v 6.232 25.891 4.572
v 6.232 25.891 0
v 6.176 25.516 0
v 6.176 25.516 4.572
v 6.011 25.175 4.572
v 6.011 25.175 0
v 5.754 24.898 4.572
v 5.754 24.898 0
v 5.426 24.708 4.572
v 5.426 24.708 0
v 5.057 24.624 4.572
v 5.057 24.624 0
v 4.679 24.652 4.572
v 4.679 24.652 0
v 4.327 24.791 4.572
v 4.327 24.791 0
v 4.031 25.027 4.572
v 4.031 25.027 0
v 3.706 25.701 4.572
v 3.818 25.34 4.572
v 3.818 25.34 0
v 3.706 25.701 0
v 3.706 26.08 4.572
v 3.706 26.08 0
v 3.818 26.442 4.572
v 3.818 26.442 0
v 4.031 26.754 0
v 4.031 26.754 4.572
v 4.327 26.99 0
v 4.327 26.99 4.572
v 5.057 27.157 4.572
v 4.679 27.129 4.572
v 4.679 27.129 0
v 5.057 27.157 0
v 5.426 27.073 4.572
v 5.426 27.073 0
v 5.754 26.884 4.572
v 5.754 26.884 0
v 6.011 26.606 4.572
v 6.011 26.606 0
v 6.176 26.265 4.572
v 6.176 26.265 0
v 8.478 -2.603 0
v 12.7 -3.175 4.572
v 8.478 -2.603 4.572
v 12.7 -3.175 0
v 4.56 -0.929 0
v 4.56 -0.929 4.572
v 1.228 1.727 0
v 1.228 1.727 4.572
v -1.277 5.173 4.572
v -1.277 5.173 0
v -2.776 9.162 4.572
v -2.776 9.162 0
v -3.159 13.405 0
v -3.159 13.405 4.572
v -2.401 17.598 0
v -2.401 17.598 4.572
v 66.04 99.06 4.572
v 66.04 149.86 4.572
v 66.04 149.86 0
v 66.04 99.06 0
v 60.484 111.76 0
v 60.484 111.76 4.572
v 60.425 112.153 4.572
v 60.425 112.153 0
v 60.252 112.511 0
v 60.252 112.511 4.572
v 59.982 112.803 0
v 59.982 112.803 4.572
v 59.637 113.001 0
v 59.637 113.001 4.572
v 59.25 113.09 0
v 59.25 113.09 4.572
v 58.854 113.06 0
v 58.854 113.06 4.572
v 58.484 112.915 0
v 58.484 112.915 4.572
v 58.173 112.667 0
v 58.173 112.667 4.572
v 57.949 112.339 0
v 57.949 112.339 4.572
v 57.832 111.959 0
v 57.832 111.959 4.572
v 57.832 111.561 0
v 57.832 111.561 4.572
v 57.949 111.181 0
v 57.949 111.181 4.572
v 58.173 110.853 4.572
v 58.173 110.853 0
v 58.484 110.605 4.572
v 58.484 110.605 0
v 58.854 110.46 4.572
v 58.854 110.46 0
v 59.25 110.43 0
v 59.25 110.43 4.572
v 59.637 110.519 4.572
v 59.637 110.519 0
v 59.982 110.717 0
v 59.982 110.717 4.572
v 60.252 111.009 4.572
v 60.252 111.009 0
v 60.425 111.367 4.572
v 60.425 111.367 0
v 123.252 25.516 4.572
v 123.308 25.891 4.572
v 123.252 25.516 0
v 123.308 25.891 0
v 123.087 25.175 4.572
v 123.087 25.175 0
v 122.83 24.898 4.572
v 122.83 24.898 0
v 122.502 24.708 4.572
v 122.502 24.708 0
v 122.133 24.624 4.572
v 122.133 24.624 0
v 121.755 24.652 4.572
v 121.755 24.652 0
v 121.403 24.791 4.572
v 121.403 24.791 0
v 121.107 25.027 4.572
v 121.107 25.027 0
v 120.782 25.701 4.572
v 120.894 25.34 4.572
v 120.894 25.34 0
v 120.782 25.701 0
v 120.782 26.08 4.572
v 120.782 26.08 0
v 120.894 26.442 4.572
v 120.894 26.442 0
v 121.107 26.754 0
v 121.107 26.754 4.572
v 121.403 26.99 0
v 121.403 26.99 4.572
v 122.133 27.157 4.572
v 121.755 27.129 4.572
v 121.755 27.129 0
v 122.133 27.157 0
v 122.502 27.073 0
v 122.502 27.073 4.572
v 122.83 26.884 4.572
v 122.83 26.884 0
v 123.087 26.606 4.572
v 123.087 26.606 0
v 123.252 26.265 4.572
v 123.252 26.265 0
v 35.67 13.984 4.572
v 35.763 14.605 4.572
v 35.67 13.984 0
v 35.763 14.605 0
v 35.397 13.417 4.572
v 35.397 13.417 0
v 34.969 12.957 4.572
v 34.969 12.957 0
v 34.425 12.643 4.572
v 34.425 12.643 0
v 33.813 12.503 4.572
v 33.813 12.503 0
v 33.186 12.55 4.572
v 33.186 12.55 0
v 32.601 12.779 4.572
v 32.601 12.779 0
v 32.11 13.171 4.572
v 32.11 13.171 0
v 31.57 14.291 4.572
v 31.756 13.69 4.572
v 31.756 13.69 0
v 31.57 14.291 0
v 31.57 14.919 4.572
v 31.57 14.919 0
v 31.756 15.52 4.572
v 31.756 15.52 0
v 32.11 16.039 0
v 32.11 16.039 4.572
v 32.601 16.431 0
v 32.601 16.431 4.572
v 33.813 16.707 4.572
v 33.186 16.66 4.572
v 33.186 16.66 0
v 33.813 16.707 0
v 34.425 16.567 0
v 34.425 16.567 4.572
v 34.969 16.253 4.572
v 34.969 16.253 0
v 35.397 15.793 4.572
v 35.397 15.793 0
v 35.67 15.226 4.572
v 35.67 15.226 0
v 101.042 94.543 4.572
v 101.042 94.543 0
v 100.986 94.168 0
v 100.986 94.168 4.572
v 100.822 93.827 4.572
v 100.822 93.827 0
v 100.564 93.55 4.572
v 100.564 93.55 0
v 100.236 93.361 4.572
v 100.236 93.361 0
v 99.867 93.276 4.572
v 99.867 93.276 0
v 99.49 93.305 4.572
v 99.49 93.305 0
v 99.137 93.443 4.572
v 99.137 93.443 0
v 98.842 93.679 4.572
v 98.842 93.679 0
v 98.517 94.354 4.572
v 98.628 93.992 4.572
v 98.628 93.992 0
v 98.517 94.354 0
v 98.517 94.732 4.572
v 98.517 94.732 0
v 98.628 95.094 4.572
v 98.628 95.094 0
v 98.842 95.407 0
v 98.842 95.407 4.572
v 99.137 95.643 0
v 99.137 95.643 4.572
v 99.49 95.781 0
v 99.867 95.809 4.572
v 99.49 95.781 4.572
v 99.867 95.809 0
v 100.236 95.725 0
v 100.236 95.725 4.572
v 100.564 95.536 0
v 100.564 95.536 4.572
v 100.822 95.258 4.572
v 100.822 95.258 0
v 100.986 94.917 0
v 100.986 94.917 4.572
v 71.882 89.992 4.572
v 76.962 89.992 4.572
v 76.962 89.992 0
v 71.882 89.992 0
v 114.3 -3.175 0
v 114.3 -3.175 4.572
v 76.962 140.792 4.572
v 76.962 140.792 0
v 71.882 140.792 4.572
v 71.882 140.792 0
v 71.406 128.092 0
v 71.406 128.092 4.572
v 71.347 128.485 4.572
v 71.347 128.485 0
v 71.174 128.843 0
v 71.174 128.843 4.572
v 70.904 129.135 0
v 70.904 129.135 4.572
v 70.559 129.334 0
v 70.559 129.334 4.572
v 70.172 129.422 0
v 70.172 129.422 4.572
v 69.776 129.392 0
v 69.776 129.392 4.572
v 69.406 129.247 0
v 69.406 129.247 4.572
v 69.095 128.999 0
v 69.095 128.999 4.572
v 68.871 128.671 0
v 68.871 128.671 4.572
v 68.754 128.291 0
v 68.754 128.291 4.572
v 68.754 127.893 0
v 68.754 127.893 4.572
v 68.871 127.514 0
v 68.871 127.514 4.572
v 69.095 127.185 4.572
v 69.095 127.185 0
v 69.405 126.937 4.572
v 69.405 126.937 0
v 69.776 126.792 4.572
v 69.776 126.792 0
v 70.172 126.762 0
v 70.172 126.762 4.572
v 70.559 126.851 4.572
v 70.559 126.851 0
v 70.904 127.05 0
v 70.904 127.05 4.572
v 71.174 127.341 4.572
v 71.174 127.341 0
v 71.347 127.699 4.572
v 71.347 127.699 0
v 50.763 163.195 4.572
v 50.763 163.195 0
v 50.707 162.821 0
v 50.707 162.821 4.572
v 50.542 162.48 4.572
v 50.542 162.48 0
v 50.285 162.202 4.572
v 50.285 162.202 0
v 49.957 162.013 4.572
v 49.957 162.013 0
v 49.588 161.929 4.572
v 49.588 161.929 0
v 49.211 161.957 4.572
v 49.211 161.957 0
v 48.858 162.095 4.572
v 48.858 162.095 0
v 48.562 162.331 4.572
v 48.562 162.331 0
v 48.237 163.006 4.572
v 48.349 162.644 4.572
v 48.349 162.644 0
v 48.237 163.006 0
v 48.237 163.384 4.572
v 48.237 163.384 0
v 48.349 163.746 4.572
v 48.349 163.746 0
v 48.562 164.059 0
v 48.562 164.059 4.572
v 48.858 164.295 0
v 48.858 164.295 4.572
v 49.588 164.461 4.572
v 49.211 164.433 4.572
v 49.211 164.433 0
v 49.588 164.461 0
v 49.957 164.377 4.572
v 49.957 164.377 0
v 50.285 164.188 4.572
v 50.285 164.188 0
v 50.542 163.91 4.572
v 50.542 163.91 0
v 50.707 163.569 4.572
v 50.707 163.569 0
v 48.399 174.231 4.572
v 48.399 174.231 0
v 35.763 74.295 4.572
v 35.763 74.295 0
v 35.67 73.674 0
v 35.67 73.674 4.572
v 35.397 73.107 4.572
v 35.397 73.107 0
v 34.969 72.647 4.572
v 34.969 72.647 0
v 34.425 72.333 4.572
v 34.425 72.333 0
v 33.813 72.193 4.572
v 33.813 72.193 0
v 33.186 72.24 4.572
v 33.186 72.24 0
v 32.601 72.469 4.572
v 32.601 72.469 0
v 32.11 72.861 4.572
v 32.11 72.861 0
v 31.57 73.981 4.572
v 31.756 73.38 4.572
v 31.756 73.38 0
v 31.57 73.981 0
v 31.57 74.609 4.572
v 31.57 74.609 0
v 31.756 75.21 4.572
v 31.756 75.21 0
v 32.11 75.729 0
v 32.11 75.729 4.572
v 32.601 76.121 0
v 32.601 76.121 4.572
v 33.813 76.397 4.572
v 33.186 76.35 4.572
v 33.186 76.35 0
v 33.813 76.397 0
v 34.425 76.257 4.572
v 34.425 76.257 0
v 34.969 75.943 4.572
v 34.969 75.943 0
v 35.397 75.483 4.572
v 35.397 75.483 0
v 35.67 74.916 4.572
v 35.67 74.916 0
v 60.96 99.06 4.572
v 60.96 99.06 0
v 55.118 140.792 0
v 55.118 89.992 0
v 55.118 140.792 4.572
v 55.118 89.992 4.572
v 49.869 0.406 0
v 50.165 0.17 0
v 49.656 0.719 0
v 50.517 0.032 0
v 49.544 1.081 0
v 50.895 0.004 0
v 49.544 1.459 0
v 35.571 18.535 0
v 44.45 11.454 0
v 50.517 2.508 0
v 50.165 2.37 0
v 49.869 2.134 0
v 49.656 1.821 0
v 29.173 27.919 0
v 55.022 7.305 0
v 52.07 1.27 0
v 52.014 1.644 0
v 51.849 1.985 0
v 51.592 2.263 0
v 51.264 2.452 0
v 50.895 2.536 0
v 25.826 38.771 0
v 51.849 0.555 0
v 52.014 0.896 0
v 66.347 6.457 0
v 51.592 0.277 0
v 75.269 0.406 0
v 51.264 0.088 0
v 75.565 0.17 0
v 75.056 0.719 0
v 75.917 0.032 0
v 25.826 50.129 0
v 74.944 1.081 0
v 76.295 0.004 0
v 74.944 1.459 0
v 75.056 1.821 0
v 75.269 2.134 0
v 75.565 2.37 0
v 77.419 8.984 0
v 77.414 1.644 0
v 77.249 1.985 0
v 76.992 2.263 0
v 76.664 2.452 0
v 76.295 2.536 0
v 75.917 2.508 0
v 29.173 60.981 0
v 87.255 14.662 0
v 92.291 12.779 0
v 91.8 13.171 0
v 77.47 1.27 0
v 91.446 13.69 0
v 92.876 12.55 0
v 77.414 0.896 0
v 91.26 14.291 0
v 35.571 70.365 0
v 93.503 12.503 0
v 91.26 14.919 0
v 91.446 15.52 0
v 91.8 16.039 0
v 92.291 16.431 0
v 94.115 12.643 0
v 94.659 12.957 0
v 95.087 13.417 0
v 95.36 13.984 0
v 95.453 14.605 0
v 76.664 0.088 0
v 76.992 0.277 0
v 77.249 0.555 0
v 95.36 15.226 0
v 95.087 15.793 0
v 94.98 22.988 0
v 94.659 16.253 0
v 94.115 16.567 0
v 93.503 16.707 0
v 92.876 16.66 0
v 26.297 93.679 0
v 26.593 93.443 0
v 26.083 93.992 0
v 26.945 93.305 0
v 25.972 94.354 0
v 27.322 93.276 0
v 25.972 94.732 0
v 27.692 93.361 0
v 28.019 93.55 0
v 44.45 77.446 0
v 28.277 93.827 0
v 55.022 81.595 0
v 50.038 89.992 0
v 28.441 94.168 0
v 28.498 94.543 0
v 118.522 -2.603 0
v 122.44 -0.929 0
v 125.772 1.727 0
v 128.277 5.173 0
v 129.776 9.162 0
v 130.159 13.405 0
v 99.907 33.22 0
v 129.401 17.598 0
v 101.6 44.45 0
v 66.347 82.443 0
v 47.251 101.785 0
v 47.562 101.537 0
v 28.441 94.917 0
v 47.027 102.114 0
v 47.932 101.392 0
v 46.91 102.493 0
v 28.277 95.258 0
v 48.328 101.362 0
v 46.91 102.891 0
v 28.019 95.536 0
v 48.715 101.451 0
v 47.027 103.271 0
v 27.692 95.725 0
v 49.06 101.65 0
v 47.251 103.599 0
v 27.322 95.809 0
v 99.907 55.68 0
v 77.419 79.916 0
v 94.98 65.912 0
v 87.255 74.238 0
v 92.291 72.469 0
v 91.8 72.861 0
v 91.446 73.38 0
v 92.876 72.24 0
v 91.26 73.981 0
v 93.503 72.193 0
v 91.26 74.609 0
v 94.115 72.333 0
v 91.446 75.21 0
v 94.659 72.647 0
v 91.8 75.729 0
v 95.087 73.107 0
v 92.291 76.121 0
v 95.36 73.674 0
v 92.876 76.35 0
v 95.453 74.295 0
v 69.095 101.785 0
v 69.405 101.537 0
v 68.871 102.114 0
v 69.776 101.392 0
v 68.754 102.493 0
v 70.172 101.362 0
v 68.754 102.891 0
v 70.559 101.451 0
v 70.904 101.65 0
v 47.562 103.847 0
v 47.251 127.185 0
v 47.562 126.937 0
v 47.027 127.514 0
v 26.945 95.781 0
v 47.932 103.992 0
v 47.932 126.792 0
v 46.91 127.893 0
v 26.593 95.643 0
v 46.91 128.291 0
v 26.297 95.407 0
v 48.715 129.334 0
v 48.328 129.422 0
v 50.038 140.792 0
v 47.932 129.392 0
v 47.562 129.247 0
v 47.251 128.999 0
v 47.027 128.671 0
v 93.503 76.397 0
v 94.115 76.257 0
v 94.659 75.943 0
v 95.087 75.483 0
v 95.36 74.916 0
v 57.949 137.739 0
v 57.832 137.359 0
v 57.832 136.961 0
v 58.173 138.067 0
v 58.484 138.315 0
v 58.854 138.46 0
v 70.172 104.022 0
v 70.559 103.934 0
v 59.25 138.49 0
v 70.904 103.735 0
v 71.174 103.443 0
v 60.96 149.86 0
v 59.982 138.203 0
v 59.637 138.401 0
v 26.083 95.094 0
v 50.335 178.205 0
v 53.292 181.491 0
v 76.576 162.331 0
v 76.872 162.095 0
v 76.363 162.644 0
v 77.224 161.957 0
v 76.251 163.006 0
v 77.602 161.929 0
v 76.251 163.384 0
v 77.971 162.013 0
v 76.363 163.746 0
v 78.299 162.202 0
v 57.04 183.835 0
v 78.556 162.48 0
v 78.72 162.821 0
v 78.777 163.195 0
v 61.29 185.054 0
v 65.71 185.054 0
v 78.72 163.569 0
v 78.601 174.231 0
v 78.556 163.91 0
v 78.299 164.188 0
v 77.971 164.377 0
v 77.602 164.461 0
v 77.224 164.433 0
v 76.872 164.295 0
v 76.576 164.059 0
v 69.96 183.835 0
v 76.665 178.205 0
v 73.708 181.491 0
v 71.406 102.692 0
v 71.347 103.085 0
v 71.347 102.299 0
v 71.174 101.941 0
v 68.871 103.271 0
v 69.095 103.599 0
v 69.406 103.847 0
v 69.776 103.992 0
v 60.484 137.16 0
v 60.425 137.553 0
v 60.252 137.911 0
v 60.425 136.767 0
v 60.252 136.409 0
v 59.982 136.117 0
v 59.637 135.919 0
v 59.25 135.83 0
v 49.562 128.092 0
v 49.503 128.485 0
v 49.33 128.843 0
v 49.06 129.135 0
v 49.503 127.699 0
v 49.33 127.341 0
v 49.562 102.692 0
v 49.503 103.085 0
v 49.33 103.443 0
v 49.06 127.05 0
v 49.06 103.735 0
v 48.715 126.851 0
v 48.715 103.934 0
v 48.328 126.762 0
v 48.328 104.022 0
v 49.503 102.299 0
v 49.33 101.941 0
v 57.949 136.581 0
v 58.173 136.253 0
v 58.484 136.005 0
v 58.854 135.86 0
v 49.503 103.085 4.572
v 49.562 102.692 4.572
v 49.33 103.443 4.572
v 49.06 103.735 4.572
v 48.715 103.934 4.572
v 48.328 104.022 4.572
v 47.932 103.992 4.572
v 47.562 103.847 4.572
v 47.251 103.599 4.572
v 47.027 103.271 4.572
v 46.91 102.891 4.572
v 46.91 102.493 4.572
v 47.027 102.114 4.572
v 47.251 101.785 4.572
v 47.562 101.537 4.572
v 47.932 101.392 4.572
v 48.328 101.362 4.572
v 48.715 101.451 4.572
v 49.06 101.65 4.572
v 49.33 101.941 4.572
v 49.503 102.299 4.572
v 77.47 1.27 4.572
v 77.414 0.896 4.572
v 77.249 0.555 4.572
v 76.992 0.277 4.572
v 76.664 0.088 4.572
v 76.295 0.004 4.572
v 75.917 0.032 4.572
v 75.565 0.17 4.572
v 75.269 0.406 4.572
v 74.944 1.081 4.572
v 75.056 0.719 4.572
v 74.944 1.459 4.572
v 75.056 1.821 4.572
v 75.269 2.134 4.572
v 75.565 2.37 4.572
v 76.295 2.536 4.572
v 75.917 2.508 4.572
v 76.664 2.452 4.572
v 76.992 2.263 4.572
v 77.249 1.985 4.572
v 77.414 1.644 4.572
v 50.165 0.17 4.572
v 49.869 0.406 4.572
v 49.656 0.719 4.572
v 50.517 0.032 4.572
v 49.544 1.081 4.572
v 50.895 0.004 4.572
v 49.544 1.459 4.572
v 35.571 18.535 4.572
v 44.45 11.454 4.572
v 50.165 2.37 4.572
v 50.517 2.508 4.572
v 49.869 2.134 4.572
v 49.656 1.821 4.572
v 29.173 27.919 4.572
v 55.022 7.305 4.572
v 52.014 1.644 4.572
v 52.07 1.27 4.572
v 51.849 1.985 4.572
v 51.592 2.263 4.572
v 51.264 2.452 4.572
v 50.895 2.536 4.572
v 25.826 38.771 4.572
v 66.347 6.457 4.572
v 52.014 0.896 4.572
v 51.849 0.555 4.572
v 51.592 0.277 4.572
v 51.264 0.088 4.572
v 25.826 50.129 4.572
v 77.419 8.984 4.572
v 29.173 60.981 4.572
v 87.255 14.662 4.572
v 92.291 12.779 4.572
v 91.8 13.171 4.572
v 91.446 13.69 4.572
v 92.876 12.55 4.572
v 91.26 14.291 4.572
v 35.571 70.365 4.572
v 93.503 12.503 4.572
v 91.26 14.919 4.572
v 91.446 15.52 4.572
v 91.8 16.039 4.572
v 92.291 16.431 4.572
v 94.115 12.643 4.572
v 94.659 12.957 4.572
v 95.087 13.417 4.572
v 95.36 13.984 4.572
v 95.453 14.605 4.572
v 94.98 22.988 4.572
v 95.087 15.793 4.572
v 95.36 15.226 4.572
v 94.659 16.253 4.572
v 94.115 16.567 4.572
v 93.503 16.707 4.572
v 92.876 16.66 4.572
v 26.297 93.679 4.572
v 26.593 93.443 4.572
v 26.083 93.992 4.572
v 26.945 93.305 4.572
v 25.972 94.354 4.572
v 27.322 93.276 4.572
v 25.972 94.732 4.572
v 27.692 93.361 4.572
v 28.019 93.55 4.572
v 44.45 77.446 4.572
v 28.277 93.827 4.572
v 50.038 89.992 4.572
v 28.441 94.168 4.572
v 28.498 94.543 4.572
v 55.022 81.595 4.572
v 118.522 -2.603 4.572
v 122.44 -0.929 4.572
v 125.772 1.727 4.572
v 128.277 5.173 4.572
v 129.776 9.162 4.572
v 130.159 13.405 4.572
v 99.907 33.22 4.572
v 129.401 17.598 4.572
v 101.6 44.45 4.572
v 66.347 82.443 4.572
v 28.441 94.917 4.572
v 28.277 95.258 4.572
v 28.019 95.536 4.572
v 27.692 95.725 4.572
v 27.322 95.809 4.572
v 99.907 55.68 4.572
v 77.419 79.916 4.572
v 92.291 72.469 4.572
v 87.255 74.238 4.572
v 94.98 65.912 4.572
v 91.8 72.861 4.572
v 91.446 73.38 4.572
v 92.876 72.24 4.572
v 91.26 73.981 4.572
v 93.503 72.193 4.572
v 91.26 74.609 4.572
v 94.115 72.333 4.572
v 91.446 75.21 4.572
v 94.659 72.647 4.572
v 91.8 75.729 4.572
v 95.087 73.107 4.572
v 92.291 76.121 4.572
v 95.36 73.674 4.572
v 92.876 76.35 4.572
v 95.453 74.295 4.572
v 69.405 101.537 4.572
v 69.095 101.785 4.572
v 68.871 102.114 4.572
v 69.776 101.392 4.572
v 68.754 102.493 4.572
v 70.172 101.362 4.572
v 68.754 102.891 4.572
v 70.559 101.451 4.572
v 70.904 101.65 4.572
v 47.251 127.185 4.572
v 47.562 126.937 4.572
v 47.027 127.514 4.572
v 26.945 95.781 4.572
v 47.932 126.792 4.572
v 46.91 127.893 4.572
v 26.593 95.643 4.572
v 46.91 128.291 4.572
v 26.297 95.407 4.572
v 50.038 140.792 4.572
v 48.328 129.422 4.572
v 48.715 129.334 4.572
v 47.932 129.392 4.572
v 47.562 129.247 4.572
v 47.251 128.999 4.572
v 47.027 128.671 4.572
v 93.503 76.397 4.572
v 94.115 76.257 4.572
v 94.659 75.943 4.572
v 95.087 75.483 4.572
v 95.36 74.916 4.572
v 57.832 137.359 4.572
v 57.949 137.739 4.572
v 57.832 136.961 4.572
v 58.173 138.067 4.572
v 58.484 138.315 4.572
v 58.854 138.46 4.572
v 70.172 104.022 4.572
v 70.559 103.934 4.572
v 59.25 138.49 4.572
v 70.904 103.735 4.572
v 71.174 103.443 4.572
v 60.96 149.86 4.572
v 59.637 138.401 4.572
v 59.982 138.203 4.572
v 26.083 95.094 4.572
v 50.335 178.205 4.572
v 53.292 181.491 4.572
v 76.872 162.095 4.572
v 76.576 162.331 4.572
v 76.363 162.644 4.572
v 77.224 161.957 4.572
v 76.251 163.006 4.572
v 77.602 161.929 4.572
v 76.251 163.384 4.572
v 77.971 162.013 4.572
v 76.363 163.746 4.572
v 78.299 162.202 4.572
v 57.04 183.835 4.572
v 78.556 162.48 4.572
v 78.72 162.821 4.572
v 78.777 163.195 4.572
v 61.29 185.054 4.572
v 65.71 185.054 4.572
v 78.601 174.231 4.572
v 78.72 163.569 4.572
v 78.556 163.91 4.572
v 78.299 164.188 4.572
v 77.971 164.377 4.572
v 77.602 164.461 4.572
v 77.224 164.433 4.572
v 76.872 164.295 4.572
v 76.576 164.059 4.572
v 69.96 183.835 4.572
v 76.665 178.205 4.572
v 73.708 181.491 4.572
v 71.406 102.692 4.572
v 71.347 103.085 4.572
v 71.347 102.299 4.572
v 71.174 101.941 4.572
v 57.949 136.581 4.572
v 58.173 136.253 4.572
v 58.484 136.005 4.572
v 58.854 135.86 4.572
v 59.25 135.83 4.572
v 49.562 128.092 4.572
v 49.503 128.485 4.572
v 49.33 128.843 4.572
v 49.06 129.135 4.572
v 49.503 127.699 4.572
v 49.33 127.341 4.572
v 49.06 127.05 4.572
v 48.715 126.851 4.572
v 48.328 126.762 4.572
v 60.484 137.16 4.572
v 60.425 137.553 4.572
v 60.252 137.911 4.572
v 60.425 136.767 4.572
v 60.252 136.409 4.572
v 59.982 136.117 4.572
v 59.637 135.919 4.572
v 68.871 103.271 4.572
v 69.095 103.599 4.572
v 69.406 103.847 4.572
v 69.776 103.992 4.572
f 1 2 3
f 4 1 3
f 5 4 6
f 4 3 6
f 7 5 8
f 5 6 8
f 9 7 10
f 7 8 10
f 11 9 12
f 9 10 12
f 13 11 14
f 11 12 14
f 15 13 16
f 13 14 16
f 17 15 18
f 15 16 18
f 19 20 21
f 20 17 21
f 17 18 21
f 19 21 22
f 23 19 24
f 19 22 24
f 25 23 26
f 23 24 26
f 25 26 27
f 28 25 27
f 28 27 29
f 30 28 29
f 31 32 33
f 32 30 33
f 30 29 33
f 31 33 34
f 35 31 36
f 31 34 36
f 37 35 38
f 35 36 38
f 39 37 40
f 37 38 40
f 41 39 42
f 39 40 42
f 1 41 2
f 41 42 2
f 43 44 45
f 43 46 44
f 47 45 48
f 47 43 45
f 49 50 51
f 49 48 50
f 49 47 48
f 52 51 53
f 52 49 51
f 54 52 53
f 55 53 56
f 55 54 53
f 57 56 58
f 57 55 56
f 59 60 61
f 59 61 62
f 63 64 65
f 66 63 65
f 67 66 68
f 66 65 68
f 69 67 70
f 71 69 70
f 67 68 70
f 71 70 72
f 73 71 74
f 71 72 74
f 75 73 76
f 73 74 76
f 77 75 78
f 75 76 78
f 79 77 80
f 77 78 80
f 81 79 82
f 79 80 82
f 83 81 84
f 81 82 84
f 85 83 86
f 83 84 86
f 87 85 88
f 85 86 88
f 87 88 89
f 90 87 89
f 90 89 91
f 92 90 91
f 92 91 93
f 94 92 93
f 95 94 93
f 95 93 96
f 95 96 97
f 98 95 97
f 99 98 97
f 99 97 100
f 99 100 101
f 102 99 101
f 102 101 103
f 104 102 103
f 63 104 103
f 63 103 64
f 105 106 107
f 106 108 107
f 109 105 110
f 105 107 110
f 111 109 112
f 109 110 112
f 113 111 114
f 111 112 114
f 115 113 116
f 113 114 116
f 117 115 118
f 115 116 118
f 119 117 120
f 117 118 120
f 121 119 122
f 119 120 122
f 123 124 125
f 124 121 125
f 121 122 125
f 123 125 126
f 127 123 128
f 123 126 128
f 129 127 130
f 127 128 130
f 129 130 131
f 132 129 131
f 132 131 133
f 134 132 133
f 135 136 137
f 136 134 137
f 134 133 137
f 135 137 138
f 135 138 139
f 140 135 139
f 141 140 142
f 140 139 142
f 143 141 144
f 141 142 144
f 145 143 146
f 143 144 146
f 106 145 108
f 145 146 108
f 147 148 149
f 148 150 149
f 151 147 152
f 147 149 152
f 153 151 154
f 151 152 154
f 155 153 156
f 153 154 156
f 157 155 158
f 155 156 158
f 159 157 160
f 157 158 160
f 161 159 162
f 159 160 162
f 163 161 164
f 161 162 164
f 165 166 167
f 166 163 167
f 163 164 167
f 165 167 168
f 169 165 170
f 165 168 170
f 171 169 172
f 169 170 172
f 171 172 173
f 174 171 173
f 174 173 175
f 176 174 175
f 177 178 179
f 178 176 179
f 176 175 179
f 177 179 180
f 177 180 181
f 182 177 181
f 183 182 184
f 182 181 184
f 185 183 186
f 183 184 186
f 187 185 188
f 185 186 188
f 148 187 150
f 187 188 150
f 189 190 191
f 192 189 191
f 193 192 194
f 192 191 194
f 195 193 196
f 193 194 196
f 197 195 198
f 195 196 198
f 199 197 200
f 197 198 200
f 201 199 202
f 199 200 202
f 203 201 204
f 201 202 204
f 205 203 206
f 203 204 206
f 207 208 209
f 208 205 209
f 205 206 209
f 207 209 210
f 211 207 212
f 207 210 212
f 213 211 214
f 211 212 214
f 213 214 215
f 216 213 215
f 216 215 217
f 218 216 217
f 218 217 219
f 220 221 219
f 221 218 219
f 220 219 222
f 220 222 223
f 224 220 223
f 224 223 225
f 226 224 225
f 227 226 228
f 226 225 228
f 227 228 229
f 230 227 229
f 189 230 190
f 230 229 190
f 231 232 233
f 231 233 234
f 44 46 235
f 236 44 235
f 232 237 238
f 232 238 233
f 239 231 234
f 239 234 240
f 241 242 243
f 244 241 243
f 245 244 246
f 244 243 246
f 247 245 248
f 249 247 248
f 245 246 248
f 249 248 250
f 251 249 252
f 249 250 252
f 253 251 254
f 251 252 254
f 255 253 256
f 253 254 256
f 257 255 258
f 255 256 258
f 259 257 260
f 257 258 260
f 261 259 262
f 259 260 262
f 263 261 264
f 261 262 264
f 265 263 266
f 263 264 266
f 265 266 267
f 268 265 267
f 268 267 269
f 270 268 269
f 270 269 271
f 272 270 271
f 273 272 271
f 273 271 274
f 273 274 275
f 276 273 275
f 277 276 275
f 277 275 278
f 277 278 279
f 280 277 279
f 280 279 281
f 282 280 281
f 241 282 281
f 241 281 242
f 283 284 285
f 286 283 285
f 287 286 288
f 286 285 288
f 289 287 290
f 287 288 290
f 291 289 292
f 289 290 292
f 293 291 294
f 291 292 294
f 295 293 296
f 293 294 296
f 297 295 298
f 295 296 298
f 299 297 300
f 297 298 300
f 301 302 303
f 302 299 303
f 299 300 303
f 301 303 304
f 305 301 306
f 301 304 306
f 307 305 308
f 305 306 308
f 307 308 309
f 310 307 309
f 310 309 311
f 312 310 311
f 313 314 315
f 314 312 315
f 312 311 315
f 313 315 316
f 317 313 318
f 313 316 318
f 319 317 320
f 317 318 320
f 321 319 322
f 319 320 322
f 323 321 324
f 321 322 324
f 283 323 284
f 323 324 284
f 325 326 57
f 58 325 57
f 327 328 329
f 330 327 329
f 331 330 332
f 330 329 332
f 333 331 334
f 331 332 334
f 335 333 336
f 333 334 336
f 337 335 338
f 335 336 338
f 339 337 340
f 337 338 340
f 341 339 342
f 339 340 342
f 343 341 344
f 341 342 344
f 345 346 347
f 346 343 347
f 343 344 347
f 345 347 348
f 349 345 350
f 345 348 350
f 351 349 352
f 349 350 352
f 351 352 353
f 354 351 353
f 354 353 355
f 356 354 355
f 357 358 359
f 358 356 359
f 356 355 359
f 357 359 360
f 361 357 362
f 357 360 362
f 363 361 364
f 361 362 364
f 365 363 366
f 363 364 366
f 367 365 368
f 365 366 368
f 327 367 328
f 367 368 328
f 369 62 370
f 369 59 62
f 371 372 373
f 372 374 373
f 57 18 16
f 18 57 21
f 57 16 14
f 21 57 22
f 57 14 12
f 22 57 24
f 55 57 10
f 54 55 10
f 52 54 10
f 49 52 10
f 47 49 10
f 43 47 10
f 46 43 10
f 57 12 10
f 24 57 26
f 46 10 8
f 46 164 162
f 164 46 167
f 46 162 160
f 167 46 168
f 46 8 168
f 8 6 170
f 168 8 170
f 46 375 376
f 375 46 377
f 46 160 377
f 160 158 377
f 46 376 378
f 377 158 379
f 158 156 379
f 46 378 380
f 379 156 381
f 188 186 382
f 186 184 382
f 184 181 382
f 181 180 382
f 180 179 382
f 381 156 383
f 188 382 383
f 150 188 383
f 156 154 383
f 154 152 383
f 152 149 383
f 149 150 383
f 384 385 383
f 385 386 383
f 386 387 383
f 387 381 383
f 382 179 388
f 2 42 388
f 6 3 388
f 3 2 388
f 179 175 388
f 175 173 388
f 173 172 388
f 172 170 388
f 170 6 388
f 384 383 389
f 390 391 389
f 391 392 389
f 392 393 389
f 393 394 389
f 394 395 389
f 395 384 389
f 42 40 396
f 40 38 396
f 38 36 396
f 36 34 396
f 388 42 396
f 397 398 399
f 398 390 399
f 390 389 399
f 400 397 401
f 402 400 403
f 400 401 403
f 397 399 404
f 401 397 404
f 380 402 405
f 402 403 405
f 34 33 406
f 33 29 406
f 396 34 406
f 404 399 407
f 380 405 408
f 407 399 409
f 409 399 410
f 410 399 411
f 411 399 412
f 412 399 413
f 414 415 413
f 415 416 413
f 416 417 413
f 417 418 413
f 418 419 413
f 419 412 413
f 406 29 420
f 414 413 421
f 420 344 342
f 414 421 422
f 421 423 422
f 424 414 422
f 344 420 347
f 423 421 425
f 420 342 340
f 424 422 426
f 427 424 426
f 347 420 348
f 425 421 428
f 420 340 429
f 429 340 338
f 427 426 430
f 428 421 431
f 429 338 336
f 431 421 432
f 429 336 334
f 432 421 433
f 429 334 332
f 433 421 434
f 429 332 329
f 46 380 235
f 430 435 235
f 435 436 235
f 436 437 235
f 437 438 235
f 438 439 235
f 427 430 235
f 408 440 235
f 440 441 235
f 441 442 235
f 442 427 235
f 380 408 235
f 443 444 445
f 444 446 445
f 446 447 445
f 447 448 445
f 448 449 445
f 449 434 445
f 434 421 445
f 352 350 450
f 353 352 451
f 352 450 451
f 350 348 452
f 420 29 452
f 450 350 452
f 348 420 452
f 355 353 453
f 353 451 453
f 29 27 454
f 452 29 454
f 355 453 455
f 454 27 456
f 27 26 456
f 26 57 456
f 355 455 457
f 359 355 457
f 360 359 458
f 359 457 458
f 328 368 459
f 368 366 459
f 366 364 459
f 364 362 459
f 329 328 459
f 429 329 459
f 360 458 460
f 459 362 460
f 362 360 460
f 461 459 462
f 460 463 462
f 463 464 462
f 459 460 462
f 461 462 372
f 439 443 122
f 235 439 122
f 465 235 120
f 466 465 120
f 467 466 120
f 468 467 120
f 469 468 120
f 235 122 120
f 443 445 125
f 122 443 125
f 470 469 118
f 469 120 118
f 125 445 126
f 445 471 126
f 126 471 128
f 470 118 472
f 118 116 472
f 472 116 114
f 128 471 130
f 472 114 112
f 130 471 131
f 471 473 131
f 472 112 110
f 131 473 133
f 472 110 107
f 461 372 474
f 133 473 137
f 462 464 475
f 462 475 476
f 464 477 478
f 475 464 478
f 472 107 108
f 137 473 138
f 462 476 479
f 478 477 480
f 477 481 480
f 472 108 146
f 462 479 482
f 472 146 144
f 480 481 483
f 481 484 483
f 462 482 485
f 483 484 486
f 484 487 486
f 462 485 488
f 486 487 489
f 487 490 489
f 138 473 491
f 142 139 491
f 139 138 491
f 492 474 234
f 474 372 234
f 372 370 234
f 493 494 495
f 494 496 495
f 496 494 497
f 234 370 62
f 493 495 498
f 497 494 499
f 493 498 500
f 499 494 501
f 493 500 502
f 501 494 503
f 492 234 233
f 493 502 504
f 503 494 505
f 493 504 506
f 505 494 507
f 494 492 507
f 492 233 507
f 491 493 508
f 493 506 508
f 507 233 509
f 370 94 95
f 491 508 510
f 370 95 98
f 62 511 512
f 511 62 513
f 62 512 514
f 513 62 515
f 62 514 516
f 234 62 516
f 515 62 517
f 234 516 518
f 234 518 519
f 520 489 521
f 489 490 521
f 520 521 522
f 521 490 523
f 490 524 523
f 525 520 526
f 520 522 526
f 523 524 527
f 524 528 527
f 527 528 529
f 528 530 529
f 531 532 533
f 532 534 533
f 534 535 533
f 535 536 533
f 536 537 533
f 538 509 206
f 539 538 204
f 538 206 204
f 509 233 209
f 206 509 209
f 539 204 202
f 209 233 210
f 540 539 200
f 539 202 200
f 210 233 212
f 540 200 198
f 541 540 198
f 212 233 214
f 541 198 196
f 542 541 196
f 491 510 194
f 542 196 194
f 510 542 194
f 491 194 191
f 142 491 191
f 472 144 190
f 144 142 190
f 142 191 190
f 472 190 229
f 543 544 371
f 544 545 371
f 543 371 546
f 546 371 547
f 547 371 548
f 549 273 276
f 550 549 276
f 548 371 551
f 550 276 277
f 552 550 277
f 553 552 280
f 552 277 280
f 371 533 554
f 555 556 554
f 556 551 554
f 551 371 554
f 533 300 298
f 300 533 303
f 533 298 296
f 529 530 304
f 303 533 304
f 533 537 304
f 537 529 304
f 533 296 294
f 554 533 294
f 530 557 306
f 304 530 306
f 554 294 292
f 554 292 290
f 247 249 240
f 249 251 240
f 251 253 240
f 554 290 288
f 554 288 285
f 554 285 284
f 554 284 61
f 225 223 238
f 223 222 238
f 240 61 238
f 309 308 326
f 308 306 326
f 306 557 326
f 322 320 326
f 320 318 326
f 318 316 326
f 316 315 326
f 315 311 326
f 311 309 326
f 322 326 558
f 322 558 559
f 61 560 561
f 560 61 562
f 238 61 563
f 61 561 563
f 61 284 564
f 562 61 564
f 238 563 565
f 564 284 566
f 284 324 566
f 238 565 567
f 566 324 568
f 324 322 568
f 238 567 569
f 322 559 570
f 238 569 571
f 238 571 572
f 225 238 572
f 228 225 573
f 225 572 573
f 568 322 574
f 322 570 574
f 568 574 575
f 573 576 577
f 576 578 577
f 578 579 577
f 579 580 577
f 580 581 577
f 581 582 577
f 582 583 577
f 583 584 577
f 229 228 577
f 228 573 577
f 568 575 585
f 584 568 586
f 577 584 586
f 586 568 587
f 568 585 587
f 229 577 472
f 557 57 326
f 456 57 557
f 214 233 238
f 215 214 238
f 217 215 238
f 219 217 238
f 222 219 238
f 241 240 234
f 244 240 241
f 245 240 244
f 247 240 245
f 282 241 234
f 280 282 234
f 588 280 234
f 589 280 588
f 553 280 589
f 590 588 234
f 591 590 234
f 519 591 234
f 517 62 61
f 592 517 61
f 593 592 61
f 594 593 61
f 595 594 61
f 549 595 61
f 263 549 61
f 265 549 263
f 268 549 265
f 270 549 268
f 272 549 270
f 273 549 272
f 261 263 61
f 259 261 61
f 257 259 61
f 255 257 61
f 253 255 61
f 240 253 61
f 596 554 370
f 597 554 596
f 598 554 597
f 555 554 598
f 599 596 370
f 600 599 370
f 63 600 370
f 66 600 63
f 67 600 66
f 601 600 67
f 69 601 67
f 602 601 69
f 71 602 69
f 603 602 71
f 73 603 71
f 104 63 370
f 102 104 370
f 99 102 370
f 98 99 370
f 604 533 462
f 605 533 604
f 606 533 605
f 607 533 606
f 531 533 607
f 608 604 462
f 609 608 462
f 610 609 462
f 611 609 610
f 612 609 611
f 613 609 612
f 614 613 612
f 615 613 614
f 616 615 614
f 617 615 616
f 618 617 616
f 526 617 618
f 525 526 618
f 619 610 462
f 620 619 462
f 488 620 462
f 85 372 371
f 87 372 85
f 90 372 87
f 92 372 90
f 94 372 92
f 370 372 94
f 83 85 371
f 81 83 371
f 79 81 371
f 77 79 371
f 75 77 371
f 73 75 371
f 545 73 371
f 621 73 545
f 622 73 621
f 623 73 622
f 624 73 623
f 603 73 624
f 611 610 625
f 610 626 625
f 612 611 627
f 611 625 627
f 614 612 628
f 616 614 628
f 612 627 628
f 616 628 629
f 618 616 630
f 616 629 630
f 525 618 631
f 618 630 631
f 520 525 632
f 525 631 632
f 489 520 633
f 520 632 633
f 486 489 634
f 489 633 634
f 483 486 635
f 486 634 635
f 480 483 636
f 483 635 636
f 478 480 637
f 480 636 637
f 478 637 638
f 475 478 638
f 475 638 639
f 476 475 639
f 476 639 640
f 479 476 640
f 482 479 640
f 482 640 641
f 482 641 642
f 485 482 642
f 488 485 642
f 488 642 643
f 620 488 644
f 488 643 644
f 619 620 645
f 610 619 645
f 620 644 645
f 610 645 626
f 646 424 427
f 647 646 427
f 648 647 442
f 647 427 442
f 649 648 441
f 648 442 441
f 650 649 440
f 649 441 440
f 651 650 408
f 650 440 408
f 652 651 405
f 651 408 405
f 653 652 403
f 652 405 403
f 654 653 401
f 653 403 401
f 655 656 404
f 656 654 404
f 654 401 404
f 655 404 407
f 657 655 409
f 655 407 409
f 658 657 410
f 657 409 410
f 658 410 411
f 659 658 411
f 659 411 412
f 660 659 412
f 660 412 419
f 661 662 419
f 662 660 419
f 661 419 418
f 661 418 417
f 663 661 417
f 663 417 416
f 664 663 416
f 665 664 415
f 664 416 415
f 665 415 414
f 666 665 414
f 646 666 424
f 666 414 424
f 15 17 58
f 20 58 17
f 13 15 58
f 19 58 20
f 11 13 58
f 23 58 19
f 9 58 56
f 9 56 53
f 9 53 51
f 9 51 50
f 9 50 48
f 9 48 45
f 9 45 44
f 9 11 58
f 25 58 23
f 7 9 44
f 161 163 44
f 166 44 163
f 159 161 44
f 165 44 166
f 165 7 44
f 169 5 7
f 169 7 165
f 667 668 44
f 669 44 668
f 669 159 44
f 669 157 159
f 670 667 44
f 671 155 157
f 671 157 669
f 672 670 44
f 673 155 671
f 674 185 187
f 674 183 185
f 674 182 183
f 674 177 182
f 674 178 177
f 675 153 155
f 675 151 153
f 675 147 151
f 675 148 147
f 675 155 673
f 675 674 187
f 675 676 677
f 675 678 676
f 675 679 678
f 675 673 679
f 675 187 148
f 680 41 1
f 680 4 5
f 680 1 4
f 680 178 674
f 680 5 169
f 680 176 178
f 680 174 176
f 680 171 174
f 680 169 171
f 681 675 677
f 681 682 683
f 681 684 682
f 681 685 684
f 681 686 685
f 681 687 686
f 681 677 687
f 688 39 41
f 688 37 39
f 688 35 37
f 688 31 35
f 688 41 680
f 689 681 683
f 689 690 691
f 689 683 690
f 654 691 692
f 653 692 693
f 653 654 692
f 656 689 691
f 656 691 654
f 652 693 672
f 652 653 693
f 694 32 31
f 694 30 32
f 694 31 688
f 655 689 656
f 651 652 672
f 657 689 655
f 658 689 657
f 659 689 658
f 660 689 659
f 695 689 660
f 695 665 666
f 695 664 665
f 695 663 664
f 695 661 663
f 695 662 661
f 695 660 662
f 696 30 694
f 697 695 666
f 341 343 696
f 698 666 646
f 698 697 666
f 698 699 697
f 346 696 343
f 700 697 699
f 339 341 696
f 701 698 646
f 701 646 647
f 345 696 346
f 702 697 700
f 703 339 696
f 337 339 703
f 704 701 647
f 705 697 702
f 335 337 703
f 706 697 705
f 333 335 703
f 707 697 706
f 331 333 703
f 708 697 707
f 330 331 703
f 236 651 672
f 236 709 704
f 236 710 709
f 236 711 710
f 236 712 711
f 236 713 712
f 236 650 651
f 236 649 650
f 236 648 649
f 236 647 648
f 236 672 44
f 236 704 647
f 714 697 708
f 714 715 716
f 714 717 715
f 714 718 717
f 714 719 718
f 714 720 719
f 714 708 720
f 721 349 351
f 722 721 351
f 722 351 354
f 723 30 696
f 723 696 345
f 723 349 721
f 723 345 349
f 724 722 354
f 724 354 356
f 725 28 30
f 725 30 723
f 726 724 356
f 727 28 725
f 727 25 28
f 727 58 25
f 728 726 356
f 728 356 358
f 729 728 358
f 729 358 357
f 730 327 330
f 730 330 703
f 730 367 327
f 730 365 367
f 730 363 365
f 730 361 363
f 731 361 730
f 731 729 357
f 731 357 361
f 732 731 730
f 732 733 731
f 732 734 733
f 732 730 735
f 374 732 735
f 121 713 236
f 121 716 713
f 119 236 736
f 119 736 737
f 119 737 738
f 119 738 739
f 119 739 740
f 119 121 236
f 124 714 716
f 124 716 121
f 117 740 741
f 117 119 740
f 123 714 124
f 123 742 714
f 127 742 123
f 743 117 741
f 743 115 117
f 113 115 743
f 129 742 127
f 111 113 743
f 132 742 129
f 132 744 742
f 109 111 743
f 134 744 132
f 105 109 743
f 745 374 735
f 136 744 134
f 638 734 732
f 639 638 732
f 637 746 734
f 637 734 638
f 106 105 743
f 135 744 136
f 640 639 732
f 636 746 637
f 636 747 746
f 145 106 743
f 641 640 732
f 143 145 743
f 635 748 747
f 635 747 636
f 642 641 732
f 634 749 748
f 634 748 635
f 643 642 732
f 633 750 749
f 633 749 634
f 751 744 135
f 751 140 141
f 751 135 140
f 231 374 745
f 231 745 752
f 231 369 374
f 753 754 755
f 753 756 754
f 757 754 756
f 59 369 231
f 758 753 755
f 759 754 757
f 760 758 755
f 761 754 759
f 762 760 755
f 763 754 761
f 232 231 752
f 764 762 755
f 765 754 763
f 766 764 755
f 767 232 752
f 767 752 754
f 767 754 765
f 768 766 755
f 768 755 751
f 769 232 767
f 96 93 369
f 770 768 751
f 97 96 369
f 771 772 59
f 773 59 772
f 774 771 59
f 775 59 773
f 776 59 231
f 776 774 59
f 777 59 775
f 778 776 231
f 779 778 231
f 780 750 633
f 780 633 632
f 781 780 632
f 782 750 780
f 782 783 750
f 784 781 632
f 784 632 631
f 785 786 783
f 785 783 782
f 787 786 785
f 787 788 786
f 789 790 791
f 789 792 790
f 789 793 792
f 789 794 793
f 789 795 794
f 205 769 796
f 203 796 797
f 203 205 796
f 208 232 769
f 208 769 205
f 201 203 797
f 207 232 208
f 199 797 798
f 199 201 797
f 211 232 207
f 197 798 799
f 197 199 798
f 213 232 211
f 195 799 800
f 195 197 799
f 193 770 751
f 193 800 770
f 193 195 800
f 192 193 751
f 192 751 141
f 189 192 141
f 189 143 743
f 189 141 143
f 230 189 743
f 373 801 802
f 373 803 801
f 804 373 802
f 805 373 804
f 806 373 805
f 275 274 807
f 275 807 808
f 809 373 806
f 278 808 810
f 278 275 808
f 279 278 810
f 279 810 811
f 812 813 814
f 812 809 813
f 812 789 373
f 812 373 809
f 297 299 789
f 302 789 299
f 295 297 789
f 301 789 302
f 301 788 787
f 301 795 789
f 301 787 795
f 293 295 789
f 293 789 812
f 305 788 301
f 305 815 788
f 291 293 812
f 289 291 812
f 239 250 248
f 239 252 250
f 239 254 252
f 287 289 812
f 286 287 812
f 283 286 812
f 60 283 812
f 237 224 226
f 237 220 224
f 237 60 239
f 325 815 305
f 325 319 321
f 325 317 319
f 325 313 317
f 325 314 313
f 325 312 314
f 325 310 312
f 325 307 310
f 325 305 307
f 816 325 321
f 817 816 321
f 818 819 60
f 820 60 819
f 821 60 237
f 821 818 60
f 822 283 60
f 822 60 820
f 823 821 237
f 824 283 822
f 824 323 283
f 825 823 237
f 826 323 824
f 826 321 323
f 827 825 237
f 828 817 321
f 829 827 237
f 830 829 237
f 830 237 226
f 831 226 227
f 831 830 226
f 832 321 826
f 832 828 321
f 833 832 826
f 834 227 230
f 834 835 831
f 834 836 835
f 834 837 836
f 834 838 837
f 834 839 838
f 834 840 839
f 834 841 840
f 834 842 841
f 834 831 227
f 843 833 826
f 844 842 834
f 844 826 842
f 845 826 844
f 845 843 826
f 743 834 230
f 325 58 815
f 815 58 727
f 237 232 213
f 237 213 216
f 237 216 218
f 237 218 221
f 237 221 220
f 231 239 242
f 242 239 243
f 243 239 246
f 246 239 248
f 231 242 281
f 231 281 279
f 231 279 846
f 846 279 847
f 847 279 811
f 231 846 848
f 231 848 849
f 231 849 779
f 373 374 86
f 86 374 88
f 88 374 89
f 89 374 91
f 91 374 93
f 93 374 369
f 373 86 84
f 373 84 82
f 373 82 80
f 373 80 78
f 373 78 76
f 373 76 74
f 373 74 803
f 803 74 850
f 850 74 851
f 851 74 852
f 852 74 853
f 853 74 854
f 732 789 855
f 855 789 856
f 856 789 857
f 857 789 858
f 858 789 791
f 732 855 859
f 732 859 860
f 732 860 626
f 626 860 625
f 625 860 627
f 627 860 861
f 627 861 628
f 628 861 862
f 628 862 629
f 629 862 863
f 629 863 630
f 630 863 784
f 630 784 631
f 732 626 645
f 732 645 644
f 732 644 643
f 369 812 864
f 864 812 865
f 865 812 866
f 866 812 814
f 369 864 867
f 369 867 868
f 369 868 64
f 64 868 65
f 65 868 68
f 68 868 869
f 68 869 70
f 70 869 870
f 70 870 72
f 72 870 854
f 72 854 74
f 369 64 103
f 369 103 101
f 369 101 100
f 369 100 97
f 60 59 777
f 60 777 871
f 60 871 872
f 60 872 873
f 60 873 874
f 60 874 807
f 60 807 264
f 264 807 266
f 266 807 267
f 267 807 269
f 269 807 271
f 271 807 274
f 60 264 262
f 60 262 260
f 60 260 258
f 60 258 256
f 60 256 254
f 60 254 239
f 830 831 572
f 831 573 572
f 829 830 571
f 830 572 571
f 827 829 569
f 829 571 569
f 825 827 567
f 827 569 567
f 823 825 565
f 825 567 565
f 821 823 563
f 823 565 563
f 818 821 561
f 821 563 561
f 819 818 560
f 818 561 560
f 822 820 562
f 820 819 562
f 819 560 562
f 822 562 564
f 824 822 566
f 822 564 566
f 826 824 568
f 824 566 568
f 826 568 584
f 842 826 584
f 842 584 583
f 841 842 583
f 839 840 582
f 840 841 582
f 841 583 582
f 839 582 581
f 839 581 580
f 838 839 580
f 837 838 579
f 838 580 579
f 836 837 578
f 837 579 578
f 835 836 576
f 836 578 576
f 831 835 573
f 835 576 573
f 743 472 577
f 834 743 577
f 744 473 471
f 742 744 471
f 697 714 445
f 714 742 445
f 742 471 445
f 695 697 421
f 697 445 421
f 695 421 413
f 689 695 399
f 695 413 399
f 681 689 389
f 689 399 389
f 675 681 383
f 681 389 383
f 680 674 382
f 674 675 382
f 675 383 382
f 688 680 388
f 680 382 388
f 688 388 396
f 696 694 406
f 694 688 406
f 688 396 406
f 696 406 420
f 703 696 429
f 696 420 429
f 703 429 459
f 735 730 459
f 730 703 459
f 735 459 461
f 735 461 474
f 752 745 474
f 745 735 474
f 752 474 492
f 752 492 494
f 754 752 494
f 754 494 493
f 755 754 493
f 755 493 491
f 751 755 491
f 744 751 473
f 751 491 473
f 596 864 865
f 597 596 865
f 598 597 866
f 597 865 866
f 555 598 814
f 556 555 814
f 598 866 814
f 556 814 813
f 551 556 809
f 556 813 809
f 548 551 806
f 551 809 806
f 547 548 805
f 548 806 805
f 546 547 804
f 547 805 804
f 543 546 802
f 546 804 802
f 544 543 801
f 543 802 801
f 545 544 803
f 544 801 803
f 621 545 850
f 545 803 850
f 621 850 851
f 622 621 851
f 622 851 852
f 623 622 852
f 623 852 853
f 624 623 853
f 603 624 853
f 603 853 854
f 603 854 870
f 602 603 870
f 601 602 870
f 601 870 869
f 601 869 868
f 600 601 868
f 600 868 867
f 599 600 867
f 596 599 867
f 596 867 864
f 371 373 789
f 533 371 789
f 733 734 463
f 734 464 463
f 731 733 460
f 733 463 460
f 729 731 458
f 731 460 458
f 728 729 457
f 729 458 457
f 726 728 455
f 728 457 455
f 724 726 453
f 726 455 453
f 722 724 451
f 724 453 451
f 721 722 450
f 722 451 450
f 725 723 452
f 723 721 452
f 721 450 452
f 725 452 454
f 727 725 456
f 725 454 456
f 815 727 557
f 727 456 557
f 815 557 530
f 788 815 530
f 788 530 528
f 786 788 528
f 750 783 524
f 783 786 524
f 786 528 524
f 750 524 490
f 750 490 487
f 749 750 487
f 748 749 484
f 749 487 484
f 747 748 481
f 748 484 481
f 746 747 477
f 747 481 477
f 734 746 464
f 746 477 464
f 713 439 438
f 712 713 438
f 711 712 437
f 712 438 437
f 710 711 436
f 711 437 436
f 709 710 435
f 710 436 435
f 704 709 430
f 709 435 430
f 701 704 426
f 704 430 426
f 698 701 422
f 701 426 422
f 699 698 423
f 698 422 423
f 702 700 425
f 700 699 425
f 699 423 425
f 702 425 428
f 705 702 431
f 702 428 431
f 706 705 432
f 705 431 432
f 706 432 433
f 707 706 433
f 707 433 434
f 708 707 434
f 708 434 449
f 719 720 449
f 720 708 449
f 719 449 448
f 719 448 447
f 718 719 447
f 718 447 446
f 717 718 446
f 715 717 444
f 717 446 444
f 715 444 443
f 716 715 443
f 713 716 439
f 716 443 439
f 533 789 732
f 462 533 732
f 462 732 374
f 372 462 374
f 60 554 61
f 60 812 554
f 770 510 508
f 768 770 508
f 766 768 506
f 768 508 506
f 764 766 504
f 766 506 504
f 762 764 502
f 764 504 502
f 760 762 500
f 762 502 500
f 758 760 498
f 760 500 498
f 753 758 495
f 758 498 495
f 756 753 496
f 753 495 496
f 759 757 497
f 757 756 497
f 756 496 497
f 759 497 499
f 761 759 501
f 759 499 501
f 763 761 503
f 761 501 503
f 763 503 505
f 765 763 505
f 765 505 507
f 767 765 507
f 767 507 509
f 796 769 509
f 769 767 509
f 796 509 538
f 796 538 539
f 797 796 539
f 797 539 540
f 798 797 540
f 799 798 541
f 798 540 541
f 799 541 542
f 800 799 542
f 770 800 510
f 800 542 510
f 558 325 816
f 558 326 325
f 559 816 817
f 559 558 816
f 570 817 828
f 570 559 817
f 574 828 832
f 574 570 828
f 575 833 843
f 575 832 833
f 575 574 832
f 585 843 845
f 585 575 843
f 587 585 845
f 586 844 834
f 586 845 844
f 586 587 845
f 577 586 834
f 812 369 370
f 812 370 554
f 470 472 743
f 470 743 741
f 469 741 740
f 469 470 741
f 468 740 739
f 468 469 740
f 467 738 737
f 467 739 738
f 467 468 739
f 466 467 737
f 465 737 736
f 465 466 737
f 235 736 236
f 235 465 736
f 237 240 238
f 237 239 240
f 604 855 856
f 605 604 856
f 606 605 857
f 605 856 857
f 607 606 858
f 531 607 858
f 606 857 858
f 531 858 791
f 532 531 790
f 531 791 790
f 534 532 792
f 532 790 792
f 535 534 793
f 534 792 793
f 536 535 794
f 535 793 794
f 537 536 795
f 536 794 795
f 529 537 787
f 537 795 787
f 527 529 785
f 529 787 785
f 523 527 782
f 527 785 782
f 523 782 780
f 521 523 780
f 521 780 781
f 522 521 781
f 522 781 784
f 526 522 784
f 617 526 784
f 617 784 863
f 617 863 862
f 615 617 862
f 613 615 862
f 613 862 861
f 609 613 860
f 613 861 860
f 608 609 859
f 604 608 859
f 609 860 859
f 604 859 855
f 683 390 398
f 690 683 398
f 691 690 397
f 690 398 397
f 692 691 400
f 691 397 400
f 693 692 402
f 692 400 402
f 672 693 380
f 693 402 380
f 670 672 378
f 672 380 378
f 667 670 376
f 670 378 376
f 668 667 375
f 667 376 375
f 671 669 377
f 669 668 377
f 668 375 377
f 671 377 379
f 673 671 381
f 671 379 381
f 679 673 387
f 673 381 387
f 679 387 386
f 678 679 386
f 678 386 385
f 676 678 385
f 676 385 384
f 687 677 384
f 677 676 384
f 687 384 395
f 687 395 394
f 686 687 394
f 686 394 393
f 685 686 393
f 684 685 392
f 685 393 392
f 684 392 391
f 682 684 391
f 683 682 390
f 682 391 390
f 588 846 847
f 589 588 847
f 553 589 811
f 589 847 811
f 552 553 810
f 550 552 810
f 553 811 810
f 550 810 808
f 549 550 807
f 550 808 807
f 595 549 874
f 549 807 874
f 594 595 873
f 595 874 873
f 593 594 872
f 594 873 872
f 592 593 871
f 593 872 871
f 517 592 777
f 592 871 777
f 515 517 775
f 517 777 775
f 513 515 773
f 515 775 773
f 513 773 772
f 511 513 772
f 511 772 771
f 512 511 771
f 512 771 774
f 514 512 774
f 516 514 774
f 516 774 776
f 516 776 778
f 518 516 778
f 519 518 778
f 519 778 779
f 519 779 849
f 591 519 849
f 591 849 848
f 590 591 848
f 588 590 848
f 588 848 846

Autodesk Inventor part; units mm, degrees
ref_plane "YZ Plane" through (0, 0, 0) normal (1, 0, 0) x (0, 1, 0)
ref_plane "XZ Plane" through (0, 0, 0) normal (0, 1, 0) x (-1, 0, 0)
ref_plane "XY Plane" through (0, 0, 0) normal (0, 0, 1) x (1, 0, 0)
sketch "Sketch1" plane through (0, 0, 0) normal (0, 0, 1) x (1, 0, 0)
  line L0 (63.5, 50.8) -> (63.5, 44.45)
  circle A0 centre (63.5, 44.45) radius 38.1
  circle A1 centre (33.655, 74.295) radius 2.1082
  circle A2 centre (93.345, 74.295) radius 2.1082
  circle A3 centre (93.345, 14.605) radius 2.1082
  circle A4 centre (33.655, 14.605) radius 2.1082
  line L1 (63.5, 82.55) -> (63.5, 86.36)
  line L2 (63.5, 86.36) -> (82.55, 86.36)
  line L3 (63.5, 86.36) -> (44.45, 86.36)
  line L4 (82.55, 86.36) -> (82.55, 134.62)
  line L5 (44.45, 86.36) -> (44.45, 134.62)
  arc A5 (82.55, 134.62) -> (44.45, 134.62) centre (63.5, 134.62) ccw
  arc A6 (-2.400661, 17.597517) -> (12.7, -3.175) centre (12.7, 12.7) ccw
  arc A7 (114.3, -3.175) -> (129.400661, 17.597517) centre (114.3, 12.7) ccw
  line L6 (114.3, -3.175) -> (12.7, -3.175)
  line L7 (48.399339, 174.230681) -> (-2.400661, 17.597517)
  line L8 (129.400661, 17.597517) -> (78.600661, 174.230681)
  arc A8 (78.600661, 174.230681) -> (48.399339, 174.230681) centre (63.5, 169.333164) ccw
  arc A9 (75.580529, 173.251177) -> (51.419471, 173.251177) centre (63.5, 169.333164) ccw
  arc A10 (0.619471, 16.618013) -> (12.7, 0) centre (12.7, 12.7) ccw
  arc A11 (114.3, 0) -> (126.380529, 16.618013) centre (114.3, 12.7) ccw
  line L9 (12.7, 0) -> (114.3, 0)
  line L10 (0.619471, 16.618013) -> (51.419471, 173.251177)
  line L11 (75.580529, 173.251177) -> (126.380529, 16.618013)
  line L12 (0.619471, 16.618013) -> (3.753882, 26.282436)
  line L13 (3.753882, 26.282436) -> (4.961935, 25.890635)
  circle A12 centre (4.961935, 25.890635) radius 1.27
  line L14 (51.419471, 173.251177) -> (48.285061, 163.586755)
  line L15 (48.285061, 163.586755) -> (49.493113, 163.194953)
  circle A13 centre (49.493113, 163.194953) radius 1.27
  circle A14 centre (27.227524, 94.542794) radius 1.27
  line L16 (75.580529, 173.251177) -> (78.714939, 163.586755)
  line L17 (78.714939, 163.586755) -> (77.506886, 163.194953)
  circle A15 centre (77.506886, 163.194953) radius 1.27
  line L18 (126.380529, 16.618013) -> (123.246118, 26.282436)
  line L19 (123.246118, 26.282436) -> (122.038065, 25.890635)
  circle A16 centre (122.038065, 25.890635) radius 1.27
  circle A17 centre (99.772476, 94.542794) radius 1.27
  line L20 (12.7, 0) -> (16.51, 0)
  line L21 (18.621315, -3.175) -> (18.621315, 1.27) construction
  line L22 (45.72, 1.27) -> (50.8, 1.27) construction
  line L23 (12.7, 0.808162) -> (16.51, 0.808162) construction
  circle A18 centre (50.8, 1.27) radius 1.27
  line L24 (109.391635, -3.175) -> (109.391635, 1.27) construction
  line L25 (81.28, 1.27) -> (76.2, 1.27) construction
  line L26 (114.432893, 0.578481) -> (110.622893, 0.578481) construction
  circle A19 centre (76.2, 1.27) radius 1.27
  point P0 (0, 0)
  point P1 (0, 0)
  dimension "d13" = 76.2
  dimension "d42" = 2.54
  dimension "d45" = 2.54
  dimension "d12" = 6.35
  dimension "d14" = 4.2164
  dimension "d15" = 4.2164
  dimension "d16" = 4.2164
  dimension "d17" = 4.2164
  dimension "d18" = 3.81
  dimension "d19" = 19.05
  dimension "d20" = 19.05
  dimension "d21" = 48.26
  dimension "d22" = 48.26
  dimension "d26" = 31.75
  dimension "d27" = 31.75
  dimension "d30" = 25.4
  dimension "d31" = 25.4
  dimension "d32" = 25.4
  dimension "d33" = 10.16
  dimension "d34" = 10.16
  dimension "d35" = 1.27
  dimension "d37" = 1.27
  dimension "d40" = 10.16
  dimension "d41" = 10.16
  dimension "d43" = 2.54
  dimension "d44" = 2.54
  dimension "d221" = 4.445
  dimension "d222" = 5.08
  dimension "d224" = 5.08
  dimension "d225" = 3.81
  dimension "d228" = 38.1
  dimension "d229" = 38.1
sketch "Sketch1 outline for Extrusion3" plane through (0, 0, 0) normal (0, 0, 1) x (1, 0, 0)
  arc A0 (78.600661, 174.230681) -> (48.399339, 174.230681) centre (63.5, 169.333164) ccw
  line L0 (129.400661, 17.597517) -> (78.600661, 174.230681)
  line L1 (48.399339, 174.230681) -> (-2.400661, 17.597517)
  arc A1 (114.3, -3.175) -> (129.400661, 17.597517) centre (114.3, 12.7) ccw
  arc A2 (-2.400661, 17.597517) -> (12.7, -3.175) centre (12.7, 12.7) ccw
  line L2 (12.7, -3.175) -> (114.3, -3.175)
  circle A3 centre (4.961935, 25.890635) radius 1.27
  circle A4 centre (33.655, 14.605) radius 2.1082
  circle A5 centre (33.655, 74.295) radius 2.1082
  circle A6 centre (93.345, 14.605) radius 2.1082
  circle A7 centre (63.5, 44.45) radius 38.1
  circle A8 centre (122.038065, 25.890635) radius 1.27
  circle A9 centre (93.345, 74.295) radius 2.1082
  circle A10 centre (27.227524, 94.542794) radius 1.27
  circle A11 centre (49.493113, 163.194953) radius 1.27
  line L3 (44.45, 86.36) -> (63.5, 86.36)
  line L4 (63.5, 86.36) -> (82.55, 86.36)
  line L5 (82.55, 86.36) -> (82.55, 134.62)
  arc A12 (82.55, 134.62) -> (44.45, 134.62) centre (63.5, 134.62) ccw
  line L6 (44.45, 134.62) -> (44.45, 86.36)
  circle A13 centre (99.772476, 94.542794) radius 1.27
  circle A14 centre (77.506886, 163.194953) radius 1.27
extrude "Extrusion3" add sketch "Sketch1 outline for Extrusion3" along normal blind 4.572
sketch "Sketch2" plane through (0, 0, 4.572) normal (0, 0, 1) x (1, 0, 0)
  line L0 (44.45, 86.36) -> (82.55, 86.36)
  line L1 (63.5, 86.36) -> (44.45, 86.36)
  line L2 (63.5, 86.36) -> (82.55, 86.36)
  line L3 (53.975, 86.36) -> (63.5, 86.36)
  line L4 (63.5, 86.36) -> (73.025, 86.36)
  line L5 (82.55, 134.62) -> (82.55, 86.36)
  line L6 (71.882, 140.7922) -> (76.962, 140.7922)
  line L7 (76.962, 140.7922) -> (76.962, 89.9922)
  line L8 (76.962, 89.9922) -> (71.882, 89.9922)
  line L9 (71.882, 89.9922) -> (71.882, 140.7922)
  circle A0 centre (70.07225, 128.0922) radius 1.3335
  circle A1 centre (70.07225, 102.6922) radius 1.3335
  line L10 (50.038, 89.9922) -> (55.118, 89.9922)
  line L11 (55.118, 89.9922) -> (55.118, 140.7922)
  line L12 (55.118, 140.7922) -> (50.038, 140.7922)
  line L13 (50.038, 140.7922) -> (50.038, 89.9922)
  line L14 (44.45, 86.36) -> (44.45, 134.62)
  circle A2 centre (48.22825, 128.0922) radius 1.3335
  circle A3 centre (48.22825, 102.6922) radius 1.3335
  line L15 (71.882, 99.06) -> (68.73875, 99.06)
  line L16 (66.04, 99.06) -> (60.96, 99.06)
  line L17 (60.96, 99.06) -> (60.96, 149.86)
  line L18 (60.96, 149.86) -> (66.04, 149.86)
  line L19 (66.04, 149.86) -> (66.04, 99.06)
  circle A4 centre (59.15025, 111.76) radius 1.3335
  circle A5 centre (59.15025, 137.16) radius 1.3335
  arc A6 (82.55, 134.62) -> (44.45, 134.62) centre (63.5, 134.62) ccw
  line L20 (44.45, 134.62) -> (44.45, 86.36)
  point P0 (0, 0)
  dimension "d183" = 5.08
  dimension "d184" = 50.8
  dimension "d185" = 3.6322
  dimension "d186" = 5.588
  dimension "d189" = 2.667
  dimension "d194" = 5.08
  dimension "d196" = 3.6322
  dimension "d197" = 5.588
  dimension "d198" = 50.8
  dimension "d199" = 1.80975
  dimension "d203" = 2.667
  dimension "d204" = 2.667
  dimension "d205" = 1.80975
  dimension "d207" = 41.7322
  dimension "d208" = 16.3322
  dimension "d209" = 1.80975
  dimension "d211" = 5.08
  dimension "d212" = 50.8
  dimension "d216" = 2.667
  dimension "d217" = 2.667
extrude "Extrusion11" add sketch "Sketch2" against normal blind 4.572
sketch "Sketch3" plane through (0, 0, 4.572) normal (0, 0, 1) x (1, 0, 0)
  point P0 (0, 0)
sketch "Sketch1 outline for Extrusion12" plane through (0, 0, 0) normal (0, 0, 1) x (1, 0, 0)
  circle A0 centre (50.8, 1.27) radius 1.27
  circle A1 centre (76.2, 1.27) radius 1.27
extrude "Extrusion12" cut sketch "Sketch1 outline for Extrusion12" along normal blind 4.572
properties part number "Nathan_LED_Speaker_Front"
